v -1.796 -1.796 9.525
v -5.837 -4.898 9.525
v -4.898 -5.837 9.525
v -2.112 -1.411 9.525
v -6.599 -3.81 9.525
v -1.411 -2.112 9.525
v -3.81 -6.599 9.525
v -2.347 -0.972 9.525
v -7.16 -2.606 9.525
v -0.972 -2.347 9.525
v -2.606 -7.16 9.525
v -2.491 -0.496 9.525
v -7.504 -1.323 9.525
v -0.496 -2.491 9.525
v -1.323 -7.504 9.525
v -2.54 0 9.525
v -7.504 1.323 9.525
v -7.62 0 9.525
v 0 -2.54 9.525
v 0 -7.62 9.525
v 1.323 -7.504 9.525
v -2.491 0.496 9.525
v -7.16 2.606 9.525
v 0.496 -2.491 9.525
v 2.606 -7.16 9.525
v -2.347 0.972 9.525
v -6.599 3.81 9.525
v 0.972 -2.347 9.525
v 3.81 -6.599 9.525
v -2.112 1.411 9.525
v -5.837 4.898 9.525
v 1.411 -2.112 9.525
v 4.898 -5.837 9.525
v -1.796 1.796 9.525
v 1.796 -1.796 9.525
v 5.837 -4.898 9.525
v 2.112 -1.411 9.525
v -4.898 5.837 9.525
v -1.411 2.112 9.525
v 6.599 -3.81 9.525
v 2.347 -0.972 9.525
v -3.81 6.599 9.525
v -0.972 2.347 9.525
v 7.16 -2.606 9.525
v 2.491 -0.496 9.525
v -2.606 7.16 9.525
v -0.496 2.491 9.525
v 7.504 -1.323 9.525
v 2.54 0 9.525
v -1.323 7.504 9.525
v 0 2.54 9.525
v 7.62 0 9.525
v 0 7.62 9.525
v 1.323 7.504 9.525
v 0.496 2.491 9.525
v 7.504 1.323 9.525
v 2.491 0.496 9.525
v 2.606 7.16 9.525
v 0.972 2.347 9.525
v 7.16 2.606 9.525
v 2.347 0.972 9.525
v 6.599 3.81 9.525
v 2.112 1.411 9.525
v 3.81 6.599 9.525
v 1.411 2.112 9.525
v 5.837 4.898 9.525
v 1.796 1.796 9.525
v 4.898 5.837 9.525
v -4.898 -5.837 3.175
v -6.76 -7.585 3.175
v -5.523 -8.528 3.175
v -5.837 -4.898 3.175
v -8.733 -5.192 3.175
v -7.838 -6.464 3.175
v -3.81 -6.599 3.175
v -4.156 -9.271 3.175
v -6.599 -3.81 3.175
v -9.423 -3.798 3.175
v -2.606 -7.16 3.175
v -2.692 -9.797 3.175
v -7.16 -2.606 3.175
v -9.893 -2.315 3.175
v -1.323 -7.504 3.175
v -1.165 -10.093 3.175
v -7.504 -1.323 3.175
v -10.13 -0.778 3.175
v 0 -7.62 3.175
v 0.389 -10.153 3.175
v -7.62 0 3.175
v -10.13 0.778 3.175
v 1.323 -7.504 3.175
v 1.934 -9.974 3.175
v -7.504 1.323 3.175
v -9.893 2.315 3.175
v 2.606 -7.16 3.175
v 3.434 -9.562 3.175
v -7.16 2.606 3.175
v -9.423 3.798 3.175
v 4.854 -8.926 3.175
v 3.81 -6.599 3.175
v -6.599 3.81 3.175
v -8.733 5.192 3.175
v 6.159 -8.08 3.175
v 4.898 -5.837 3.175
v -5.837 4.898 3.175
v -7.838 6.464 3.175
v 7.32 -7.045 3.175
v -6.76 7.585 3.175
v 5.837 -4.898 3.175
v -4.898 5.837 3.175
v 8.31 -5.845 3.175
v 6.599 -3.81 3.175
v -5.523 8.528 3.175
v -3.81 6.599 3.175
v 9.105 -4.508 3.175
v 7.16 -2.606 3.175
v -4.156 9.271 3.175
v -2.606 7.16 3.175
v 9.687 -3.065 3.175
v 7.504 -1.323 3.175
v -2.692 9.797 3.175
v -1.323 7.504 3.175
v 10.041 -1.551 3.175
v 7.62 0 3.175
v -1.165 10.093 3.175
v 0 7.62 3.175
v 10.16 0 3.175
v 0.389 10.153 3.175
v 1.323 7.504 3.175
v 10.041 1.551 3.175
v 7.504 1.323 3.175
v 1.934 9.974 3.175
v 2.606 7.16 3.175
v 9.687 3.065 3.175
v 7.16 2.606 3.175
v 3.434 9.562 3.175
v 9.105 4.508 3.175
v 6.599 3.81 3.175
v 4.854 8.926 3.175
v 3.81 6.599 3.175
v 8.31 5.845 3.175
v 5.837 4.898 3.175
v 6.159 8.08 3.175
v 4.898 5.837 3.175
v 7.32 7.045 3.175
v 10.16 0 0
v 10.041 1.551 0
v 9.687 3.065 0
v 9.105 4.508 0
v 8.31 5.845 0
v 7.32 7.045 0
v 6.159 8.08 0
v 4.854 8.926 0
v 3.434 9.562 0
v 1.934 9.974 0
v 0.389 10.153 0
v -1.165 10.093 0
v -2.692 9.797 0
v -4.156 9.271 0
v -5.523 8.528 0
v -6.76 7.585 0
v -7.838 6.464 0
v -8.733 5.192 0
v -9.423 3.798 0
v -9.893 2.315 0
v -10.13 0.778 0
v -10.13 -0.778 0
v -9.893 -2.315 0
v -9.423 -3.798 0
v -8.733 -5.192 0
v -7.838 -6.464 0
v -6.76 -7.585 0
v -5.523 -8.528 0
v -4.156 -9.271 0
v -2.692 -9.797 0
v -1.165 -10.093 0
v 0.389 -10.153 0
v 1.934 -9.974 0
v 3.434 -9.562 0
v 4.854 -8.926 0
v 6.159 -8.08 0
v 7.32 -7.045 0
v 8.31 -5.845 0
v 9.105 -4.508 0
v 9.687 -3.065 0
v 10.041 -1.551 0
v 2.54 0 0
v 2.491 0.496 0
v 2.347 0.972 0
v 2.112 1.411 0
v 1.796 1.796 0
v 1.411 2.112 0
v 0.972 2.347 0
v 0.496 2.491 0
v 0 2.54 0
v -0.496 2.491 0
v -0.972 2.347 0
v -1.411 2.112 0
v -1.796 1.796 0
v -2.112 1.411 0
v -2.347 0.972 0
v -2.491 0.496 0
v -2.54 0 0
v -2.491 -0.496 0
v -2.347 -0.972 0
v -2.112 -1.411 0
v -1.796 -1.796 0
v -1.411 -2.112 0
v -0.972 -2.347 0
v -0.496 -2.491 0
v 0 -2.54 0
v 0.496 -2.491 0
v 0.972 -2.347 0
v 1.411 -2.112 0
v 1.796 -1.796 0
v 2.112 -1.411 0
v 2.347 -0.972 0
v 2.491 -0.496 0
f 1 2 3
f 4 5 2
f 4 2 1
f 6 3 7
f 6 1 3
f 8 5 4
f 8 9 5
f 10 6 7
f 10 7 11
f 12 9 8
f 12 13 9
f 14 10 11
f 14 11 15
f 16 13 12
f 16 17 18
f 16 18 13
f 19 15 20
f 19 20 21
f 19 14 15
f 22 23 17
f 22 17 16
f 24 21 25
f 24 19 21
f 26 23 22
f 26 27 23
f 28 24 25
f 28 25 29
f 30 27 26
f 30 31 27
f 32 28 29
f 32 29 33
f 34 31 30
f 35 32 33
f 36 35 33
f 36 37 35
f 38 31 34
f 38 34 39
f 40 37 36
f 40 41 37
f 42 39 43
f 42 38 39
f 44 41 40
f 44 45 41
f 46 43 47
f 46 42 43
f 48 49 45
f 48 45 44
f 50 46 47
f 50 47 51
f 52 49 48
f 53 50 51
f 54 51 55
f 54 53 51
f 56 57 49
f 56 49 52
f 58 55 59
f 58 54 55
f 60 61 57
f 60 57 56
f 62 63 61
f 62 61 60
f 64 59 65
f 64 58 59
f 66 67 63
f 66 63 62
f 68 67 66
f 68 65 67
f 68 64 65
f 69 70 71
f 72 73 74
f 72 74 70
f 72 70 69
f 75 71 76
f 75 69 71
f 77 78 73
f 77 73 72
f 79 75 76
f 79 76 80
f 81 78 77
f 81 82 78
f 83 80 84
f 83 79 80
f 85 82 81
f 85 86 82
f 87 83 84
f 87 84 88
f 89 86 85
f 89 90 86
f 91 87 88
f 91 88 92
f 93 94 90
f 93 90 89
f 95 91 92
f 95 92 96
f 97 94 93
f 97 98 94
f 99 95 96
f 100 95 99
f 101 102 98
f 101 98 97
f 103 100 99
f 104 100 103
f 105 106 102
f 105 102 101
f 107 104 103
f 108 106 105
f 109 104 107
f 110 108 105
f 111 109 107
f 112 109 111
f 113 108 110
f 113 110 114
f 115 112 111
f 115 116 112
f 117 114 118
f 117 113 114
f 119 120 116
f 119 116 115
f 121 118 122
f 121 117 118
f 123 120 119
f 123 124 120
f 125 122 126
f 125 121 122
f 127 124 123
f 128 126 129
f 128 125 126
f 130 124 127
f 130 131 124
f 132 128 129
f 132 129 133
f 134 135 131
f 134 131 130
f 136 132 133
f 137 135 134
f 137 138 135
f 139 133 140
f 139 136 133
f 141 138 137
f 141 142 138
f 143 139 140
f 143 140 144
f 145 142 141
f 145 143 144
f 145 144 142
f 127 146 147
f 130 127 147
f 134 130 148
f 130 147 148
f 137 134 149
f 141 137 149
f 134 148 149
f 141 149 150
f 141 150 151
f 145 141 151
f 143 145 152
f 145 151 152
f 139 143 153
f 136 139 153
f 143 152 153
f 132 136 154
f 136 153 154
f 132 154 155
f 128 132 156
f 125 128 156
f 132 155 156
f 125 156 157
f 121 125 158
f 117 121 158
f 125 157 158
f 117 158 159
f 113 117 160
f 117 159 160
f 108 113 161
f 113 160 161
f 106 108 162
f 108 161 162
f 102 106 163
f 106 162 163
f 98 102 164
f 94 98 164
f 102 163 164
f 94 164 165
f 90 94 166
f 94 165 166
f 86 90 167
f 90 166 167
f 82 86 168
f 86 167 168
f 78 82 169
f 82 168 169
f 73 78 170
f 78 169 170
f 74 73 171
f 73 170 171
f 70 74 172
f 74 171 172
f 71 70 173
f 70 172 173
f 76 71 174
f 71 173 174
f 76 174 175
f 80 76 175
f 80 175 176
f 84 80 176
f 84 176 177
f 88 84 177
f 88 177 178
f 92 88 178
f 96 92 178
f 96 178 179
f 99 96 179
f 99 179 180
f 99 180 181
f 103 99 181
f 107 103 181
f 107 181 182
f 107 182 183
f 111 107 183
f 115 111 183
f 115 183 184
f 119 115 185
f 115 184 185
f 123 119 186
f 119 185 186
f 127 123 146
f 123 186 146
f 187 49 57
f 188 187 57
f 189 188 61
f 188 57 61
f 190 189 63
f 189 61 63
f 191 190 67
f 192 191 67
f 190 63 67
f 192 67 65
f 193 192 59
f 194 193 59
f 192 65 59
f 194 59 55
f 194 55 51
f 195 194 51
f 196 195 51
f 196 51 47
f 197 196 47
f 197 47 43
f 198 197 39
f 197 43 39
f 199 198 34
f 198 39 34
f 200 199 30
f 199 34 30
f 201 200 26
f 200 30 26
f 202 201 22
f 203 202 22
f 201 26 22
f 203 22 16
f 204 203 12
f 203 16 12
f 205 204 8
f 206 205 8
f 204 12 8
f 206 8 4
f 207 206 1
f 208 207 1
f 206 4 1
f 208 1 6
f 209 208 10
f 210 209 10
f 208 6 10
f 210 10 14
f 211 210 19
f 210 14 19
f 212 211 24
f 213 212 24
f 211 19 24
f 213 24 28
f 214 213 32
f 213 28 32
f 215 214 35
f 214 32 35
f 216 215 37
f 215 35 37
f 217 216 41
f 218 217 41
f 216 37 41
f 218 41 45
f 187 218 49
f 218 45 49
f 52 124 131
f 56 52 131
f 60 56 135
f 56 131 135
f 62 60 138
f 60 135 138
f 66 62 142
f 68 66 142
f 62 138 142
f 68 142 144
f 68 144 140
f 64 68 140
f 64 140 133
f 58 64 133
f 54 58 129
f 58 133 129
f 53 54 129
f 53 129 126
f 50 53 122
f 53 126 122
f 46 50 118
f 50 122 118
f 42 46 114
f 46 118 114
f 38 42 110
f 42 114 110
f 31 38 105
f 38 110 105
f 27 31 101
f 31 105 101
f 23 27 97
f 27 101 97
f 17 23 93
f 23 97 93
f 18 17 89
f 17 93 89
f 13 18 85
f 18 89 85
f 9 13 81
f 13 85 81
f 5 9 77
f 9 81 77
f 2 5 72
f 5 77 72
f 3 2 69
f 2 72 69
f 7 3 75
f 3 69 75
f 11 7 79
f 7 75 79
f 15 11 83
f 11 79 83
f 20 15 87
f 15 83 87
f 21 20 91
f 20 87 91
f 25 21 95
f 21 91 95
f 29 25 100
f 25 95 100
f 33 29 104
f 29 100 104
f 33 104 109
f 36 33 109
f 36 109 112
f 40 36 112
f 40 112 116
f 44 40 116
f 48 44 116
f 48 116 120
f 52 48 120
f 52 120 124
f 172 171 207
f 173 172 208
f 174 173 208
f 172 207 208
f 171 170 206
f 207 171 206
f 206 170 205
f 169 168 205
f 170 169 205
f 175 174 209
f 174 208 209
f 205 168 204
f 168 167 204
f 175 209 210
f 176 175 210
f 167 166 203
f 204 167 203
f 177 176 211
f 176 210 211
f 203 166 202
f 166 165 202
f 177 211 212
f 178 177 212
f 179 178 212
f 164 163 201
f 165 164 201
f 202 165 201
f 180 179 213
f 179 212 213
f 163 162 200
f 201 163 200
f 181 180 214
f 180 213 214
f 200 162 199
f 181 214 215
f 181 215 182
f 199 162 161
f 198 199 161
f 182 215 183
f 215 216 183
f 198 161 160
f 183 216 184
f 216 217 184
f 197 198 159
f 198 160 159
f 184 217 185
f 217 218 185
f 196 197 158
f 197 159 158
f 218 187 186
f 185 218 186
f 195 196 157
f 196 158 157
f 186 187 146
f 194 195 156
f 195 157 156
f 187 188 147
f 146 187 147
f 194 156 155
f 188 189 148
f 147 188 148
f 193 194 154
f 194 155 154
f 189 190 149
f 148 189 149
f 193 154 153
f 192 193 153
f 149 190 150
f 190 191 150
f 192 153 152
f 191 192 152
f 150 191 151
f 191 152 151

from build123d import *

# Parameters (mm, degrees)
F0_R     = 10.16
F1_DEPTH = 3.175
F2_R     = 7.62
F3_DEPTH = 6.35
F4_R     = 2.54
F5_DEPTH = 9.525


with BuildPart() as f1:
    # F0 (on Top) → F1 (new body)
    with BuildSketch(Plane.XY):
        Circle(F0_R)
    extrude(amount=F1_DEPTH)

    # F2 (on face) → F3 (join)
    with BuildSketch(Plane.XY.offset(3.175)):
        Circle(F2_R)
    extrude(amount=F3_DEPTH)

    # F4 (on face) → F5 (cut, through all)
    with BuildSketch(Plane.XY.offset(9.525)):
        Circle(F4_R)
    extrude(amount=-F5_DEPTH, mode=Mode.SUBTRACT)


solid = f1.part
